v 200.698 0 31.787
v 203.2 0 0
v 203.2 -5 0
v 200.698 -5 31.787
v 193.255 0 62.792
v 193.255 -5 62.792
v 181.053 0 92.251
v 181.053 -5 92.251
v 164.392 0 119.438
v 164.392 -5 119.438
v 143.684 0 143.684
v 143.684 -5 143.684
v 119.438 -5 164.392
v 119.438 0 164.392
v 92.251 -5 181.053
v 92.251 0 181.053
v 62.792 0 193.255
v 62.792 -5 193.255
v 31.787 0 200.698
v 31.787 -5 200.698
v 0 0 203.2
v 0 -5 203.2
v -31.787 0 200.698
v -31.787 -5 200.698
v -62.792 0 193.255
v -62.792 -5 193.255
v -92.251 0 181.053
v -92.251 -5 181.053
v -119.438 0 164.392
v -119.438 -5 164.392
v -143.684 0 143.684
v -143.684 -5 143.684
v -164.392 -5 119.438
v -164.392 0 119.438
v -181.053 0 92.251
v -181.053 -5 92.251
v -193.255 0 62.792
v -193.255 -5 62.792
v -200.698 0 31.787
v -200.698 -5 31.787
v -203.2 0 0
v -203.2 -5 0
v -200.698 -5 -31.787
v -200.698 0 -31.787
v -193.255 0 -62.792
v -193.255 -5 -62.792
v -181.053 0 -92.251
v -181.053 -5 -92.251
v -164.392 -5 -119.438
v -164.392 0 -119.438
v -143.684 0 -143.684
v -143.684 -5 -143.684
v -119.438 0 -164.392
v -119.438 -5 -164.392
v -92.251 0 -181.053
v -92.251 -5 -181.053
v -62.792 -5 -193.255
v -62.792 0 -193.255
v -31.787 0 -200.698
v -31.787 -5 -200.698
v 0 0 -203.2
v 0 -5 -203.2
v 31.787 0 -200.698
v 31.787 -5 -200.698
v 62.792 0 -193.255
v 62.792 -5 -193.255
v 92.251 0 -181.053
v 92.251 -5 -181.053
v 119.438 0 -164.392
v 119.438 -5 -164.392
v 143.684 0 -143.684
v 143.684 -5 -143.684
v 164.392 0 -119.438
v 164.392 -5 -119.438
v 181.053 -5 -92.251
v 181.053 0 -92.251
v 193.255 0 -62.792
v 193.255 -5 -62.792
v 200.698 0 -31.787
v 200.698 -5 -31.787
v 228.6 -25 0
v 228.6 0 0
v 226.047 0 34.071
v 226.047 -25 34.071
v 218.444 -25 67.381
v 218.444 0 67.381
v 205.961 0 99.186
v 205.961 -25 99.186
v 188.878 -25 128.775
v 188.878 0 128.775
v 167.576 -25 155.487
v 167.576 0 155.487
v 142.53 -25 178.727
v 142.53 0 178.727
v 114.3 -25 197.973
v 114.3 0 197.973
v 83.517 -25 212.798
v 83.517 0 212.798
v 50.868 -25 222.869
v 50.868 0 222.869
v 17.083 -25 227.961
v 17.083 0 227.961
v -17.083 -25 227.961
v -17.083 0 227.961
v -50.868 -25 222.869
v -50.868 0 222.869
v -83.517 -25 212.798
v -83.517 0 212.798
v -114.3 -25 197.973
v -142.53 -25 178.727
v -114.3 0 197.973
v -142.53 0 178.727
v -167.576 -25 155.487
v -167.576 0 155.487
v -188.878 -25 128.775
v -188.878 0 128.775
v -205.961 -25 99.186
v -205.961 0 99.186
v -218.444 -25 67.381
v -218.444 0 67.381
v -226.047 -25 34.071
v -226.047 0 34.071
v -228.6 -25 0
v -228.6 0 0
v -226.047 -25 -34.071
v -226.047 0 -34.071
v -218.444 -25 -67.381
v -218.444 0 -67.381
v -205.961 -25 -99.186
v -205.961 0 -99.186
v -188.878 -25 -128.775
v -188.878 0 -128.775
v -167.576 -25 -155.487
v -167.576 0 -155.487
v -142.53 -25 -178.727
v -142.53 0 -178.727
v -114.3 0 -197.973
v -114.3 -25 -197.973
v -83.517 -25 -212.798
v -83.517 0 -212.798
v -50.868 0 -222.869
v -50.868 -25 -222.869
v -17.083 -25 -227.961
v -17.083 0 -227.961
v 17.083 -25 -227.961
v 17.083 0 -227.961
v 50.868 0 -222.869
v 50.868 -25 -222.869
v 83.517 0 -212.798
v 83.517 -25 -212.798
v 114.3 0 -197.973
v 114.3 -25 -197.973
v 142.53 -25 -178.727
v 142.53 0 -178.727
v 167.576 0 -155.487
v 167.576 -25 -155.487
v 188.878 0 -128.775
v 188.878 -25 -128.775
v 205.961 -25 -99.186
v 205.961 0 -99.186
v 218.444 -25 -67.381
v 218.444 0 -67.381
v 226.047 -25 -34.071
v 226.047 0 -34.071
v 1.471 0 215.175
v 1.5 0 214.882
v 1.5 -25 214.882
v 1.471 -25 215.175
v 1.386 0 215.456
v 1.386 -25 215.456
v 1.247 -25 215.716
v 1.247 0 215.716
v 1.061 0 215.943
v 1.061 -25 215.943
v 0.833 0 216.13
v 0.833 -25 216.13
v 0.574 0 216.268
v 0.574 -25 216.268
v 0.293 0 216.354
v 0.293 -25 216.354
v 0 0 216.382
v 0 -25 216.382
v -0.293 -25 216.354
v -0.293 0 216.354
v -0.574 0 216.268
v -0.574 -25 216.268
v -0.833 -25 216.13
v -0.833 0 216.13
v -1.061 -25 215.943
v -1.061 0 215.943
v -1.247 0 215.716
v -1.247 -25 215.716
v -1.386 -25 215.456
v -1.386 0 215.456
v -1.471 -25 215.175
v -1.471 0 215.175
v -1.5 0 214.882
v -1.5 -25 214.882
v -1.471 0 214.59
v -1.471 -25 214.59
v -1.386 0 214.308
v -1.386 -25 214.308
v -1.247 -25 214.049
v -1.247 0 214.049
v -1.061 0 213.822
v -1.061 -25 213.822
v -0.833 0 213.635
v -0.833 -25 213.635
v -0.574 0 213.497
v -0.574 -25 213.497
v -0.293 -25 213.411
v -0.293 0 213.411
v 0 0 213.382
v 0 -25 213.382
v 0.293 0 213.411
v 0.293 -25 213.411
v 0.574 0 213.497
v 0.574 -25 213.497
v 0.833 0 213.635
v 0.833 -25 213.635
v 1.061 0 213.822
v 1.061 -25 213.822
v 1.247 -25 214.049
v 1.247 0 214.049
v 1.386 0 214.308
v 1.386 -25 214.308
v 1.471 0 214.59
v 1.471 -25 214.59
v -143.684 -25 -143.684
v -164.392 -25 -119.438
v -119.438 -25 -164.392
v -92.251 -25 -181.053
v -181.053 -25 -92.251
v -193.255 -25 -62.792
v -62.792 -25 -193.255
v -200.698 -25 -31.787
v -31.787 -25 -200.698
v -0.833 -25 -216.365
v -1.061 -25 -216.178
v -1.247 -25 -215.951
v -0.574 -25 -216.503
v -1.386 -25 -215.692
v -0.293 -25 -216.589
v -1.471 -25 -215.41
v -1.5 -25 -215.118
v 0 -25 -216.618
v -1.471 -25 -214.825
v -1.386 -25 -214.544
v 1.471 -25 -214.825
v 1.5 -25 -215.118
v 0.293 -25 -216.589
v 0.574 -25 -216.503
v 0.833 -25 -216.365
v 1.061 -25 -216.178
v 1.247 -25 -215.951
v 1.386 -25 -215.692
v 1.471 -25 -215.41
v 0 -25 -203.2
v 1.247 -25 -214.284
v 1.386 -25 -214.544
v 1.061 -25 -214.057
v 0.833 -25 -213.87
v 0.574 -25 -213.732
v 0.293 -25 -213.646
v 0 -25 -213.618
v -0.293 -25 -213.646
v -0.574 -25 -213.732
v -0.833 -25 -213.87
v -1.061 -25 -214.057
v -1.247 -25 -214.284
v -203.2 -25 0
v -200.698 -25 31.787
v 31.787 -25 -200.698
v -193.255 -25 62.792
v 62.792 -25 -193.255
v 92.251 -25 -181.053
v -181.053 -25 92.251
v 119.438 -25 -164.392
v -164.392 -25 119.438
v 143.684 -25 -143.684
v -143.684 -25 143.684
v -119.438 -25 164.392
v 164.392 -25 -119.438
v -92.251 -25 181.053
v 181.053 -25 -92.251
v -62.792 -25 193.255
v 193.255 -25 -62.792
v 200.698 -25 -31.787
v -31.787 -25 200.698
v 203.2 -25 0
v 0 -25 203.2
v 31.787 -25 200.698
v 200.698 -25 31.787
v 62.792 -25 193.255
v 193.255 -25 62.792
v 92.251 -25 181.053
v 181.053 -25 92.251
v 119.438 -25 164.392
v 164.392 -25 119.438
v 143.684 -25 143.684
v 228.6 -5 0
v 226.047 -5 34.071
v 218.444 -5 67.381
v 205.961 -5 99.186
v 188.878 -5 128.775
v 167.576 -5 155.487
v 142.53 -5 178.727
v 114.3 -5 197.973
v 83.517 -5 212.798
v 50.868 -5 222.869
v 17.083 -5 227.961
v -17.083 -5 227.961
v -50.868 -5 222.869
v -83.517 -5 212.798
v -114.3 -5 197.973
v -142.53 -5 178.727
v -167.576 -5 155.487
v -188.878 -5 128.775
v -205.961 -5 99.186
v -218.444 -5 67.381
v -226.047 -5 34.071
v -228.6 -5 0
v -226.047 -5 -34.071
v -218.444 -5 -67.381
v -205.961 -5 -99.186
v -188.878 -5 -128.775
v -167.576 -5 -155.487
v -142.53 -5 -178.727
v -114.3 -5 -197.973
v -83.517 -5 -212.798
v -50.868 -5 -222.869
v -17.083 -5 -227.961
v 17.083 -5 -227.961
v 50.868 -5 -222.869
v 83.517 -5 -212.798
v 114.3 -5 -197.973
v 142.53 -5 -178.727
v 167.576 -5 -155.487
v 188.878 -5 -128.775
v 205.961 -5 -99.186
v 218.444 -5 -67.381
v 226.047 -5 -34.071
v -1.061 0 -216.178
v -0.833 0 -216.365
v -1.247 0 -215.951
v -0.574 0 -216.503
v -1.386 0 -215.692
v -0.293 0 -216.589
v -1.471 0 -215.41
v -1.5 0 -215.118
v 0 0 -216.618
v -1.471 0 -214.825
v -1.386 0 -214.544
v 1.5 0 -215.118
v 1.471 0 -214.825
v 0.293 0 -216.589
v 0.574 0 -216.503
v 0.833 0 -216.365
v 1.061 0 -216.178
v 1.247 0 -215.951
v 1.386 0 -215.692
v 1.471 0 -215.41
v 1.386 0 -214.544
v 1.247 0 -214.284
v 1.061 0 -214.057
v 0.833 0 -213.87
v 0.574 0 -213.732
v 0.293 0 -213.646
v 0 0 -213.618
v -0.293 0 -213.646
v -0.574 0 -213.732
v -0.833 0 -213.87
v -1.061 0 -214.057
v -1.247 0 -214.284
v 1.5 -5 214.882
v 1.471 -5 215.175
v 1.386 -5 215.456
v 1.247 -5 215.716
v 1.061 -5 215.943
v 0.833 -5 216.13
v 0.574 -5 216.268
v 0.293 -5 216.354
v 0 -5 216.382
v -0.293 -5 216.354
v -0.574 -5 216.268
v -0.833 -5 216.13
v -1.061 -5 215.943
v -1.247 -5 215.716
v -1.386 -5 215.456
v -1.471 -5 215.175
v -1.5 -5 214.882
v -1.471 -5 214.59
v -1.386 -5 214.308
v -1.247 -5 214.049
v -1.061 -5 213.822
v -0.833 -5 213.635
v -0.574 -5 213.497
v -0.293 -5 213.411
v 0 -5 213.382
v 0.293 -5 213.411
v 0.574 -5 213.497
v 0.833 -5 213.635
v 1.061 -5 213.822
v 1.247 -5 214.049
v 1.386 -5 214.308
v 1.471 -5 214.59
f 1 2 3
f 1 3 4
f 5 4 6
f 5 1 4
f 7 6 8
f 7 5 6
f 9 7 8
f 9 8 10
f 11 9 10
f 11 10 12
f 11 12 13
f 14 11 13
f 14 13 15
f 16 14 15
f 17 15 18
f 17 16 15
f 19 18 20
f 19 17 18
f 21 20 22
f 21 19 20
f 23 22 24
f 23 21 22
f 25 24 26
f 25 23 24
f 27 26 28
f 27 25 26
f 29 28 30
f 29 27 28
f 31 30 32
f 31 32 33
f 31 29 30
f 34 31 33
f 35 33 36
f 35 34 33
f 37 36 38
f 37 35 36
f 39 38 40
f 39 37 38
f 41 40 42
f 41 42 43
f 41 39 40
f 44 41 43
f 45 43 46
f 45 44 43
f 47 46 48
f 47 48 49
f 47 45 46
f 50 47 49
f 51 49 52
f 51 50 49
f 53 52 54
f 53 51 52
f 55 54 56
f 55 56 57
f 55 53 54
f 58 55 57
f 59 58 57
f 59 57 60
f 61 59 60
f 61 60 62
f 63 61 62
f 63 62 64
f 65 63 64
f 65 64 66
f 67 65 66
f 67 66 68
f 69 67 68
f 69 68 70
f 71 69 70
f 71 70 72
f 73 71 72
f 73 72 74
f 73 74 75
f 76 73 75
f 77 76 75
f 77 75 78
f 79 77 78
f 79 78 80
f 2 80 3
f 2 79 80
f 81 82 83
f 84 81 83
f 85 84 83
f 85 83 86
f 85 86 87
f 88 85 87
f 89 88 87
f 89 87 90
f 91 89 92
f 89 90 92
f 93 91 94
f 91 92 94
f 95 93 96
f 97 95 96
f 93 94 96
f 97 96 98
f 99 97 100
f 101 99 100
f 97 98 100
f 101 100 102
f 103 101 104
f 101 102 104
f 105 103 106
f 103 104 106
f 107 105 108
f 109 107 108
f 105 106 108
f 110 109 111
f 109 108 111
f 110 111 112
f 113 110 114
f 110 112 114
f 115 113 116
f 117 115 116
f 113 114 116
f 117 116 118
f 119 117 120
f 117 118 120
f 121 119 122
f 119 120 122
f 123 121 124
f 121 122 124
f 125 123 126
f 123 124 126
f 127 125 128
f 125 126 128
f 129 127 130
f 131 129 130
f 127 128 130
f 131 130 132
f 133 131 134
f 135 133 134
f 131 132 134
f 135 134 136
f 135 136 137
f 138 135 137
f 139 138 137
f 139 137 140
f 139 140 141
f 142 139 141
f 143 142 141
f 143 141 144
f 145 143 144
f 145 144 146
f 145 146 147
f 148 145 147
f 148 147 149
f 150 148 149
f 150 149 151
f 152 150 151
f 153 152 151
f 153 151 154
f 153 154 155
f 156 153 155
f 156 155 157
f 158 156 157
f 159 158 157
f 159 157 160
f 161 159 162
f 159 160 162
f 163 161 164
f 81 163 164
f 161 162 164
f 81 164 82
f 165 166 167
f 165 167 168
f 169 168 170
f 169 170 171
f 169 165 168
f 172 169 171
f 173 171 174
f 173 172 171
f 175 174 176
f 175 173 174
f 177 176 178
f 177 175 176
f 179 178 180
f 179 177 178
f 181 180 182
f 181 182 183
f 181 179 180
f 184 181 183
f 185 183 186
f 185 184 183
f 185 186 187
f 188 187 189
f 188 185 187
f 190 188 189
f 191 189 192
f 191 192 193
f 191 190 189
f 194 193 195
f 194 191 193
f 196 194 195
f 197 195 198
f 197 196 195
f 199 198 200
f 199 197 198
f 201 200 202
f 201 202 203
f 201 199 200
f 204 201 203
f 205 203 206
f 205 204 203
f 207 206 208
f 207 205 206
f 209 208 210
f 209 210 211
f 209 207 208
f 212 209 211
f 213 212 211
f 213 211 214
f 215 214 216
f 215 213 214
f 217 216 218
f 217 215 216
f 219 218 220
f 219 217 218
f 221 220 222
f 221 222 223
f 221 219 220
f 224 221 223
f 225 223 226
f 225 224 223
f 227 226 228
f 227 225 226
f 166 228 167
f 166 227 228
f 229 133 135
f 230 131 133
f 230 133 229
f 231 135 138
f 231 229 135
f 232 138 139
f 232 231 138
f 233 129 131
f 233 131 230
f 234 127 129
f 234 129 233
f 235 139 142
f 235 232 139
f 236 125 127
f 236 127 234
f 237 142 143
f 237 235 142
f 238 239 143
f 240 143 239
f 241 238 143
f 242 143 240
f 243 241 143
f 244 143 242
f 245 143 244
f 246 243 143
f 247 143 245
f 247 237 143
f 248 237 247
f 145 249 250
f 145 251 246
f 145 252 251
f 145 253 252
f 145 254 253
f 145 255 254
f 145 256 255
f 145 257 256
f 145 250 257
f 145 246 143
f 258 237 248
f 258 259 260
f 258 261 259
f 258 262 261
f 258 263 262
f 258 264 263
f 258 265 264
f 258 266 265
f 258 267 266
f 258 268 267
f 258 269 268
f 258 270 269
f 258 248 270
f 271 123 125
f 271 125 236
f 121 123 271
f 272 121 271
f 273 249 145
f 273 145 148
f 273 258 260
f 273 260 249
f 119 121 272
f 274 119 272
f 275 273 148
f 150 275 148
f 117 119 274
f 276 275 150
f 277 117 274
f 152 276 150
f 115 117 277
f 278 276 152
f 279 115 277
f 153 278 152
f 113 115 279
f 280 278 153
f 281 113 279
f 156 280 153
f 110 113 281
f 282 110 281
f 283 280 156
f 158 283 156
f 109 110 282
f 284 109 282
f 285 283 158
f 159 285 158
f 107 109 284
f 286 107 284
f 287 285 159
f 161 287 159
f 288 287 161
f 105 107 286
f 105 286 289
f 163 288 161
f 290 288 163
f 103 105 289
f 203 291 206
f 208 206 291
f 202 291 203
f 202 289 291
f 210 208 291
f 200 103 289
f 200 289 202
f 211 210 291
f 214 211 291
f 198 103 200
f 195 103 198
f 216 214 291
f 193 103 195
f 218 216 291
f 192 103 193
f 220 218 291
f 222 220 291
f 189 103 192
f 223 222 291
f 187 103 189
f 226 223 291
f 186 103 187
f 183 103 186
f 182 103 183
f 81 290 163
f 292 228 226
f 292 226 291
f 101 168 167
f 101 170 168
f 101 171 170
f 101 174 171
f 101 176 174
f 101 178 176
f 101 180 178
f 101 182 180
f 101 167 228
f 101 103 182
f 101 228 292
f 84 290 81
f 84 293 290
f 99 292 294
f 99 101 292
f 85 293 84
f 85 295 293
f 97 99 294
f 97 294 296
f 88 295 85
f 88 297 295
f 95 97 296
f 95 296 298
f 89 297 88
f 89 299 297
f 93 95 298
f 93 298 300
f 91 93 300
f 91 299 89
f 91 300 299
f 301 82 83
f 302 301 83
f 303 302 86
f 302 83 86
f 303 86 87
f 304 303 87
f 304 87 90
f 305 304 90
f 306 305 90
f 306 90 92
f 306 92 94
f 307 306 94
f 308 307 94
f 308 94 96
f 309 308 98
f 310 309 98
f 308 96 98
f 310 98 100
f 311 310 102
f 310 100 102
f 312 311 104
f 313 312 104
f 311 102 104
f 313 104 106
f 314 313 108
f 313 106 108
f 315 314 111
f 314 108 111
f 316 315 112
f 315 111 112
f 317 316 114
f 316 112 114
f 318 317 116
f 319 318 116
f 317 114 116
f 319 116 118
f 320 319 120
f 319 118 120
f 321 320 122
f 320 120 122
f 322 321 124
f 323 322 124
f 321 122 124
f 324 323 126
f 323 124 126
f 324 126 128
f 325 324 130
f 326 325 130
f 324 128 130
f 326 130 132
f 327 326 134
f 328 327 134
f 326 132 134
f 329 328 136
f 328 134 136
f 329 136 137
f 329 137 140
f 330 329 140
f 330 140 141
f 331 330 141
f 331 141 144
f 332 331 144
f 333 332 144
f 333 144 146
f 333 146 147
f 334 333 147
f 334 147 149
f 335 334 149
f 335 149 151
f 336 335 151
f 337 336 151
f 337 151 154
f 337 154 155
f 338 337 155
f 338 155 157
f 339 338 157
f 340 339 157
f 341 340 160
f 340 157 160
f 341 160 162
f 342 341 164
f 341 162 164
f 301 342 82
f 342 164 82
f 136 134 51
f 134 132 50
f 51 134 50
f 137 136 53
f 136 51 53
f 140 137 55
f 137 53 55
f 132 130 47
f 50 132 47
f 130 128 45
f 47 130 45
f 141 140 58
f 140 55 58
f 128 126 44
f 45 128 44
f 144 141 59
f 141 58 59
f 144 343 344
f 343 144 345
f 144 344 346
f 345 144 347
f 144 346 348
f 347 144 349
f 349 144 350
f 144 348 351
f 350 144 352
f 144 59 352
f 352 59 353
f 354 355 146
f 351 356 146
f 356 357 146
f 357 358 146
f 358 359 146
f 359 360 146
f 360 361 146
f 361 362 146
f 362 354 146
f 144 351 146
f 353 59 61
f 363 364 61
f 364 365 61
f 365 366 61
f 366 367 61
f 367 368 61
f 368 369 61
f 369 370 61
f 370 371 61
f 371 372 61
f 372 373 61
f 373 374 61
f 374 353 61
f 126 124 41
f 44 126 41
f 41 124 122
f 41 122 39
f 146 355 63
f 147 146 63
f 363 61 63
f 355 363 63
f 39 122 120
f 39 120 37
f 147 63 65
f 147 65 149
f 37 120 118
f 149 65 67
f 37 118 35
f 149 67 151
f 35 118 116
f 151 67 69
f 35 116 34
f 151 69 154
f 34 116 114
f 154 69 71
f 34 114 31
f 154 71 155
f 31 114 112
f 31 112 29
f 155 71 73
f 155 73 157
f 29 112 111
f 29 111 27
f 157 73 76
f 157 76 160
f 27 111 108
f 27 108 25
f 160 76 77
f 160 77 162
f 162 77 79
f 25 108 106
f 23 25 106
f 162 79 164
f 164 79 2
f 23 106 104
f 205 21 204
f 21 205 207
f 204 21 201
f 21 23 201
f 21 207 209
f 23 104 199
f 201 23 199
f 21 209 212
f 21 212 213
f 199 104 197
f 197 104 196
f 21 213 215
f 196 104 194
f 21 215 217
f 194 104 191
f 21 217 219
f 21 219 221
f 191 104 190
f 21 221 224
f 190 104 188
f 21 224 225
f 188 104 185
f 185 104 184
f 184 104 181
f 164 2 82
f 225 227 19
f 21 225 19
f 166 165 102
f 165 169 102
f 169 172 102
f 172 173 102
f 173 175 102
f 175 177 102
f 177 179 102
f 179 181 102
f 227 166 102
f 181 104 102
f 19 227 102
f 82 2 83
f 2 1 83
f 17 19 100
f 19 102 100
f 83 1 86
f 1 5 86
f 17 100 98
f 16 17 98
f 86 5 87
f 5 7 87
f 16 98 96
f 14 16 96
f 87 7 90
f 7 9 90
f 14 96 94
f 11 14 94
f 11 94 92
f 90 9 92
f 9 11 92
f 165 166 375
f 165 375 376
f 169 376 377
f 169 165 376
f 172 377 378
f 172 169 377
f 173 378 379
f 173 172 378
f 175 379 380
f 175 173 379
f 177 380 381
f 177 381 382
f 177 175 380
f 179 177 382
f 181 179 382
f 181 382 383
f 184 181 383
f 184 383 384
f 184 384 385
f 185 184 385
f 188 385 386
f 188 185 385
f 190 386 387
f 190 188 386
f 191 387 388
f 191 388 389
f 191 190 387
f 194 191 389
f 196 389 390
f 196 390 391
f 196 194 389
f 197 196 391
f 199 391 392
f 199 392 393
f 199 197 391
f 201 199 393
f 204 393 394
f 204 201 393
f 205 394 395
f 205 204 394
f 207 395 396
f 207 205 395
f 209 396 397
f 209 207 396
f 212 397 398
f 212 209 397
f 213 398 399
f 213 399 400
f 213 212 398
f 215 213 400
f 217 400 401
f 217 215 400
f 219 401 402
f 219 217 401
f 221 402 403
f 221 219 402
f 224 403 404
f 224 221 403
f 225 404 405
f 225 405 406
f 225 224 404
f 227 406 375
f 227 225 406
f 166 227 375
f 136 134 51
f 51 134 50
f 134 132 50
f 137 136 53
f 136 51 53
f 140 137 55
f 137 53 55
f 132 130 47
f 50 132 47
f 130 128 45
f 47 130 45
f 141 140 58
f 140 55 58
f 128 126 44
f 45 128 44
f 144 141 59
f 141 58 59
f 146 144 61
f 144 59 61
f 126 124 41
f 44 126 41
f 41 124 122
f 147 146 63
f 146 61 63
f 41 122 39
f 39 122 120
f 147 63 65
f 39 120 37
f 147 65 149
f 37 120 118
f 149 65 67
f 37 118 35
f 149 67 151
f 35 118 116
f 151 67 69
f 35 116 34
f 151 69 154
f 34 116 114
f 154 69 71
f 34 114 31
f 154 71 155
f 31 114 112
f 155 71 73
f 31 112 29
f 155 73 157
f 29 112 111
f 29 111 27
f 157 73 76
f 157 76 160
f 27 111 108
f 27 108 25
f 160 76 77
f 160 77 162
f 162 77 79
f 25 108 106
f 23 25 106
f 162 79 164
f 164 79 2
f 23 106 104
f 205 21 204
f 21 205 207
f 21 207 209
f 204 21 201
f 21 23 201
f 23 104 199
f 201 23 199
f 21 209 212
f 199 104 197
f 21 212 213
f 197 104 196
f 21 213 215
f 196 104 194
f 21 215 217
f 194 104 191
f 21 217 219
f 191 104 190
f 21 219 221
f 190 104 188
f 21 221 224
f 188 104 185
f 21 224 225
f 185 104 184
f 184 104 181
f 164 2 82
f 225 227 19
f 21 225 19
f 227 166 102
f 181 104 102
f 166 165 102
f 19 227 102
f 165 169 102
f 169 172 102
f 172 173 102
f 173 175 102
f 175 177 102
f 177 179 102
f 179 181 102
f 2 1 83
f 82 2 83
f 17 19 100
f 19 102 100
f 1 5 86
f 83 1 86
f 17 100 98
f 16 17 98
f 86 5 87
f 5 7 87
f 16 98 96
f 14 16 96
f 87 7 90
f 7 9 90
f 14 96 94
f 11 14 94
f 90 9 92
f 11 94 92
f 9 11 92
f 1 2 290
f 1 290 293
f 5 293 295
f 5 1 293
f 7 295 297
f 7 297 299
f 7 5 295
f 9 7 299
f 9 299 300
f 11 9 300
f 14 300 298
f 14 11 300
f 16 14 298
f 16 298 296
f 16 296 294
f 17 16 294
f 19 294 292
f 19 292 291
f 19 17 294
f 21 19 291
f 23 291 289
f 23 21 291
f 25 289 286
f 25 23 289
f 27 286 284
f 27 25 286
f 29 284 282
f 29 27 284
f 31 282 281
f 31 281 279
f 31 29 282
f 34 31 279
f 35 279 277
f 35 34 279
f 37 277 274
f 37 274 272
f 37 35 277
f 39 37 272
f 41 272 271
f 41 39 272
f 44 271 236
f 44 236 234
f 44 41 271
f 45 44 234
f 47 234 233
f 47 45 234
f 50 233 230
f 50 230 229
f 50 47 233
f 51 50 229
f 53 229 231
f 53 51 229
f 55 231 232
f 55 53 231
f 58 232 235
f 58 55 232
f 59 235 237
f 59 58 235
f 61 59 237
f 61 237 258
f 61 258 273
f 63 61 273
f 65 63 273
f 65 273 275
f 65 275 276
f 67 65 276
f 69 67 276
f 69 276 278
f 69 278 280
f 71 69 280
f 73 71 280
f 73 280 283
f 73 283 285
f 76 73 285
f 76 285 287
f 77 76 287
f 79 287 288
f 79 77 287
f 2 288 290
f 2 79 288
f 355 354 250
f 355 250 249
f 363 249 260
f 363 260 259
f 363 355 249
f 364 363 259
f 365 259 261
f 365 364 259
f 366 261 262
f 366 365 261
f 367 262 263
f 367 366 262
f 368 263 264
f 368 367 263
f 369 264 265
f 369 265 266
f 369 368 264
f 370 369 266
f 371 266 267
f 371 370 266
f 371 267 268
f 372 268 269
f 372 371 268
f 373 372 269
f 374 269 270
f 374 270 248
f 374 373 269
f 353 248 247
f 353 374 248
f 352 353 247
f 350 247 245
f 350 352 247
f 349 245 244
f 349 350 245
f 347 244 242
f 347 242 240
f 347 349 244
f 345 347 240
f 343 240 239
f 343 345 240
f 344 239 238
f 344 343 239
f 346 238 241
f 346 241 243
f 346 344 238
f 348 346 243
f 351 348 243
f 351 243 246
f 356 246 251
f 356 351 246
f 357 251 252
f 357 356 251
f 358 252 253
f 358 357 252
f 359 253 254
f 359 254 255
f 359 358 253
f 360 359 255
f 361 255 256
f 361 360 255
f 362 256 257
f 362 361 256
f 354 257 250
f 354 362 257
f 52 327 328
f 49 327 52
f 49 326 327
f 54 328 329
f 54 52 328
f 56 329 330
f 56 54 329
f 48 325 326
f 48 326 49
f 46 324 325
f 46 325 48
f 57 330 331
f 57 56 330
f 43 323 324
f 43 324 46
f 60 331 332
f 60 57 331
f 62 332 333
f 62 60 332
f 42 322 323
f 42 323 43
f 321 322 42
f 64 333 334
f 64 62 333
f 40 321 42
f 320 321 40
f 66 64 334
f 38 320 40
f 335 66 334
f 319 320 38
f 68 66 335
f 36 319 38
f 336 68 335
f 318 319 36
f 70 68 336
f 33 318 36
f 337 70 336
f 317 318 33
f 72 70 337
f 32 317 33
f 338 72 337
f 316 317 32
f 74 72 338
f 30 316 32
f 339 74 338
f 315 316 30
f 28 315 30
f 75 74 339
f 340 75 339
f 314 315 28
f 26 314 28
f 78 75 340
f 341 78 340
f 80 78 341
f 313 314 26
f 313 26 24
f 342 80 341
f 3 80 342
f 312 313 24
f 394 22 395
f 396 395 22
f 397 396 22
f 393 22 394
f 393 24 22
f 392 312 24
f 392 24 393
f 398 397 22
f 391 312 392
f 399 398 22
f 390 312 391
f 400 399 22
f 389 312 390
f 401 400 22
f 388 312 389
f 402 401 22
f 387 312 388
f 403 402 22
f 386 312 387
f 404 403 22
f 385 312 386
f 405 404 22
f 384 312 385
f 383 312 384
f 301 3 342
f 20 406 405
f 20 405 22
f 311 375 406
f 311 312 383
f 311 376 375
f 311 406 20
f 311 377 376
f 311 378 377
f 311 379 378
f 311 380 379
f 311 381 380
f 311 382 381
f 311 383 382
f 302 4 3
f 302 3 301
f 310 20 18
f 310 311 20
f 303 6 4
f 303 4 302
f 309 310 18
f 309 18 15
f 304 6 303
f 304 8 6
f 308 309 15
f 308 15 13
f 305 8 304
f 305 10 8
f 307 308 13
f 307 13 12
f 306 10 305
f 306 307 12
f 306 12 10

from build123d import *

# Parameters (mm, degrees)
F0_R     = 228.6
F0_R_2   = 1.5
F0_R_3   = 203.2
F1_DEPTH = 5
F2_DEPTH = 25


with BuildPart() as f1:
    # F0 (on Front) → F1 (new body)
    with BuildSketch(Plane.XZ):
        Circle(F0_R)
        with Locations((0, -215.117663)):
            Circle(F0_R_2, mode=Mode.SUBTRACT)
        Circle(F0_R_3, mode=Mode.SUBTRACT)
        with Locations((0, 214.882337)):
            Circle(F0_R_2, mode=Mode.SUBTRACT)
        with Locations((0, -215.117663)):
            Circle(F0_R_2)
    extrude(amount=F1_DEPTH)


with BuildPart() as f2:
    # F0 (on Front) → F2 (new body)
    with BuildSketch(Plane.XZ):
        Circle(F0_R)
        with Locations((0, -215.117663)):
            Circle(F0_R_2, mode=Mode.SUBTRACT)
        Circle(F0_R_3, mode=Mode.SUBTRACT)
        with Locations((0, 214.882337)):
            Circle(F0_R_2, mode=Mode.SUBTRACT)
    extrude(amount=F2_DEPTH)


solid = Compound([f1.part, f2.part])
